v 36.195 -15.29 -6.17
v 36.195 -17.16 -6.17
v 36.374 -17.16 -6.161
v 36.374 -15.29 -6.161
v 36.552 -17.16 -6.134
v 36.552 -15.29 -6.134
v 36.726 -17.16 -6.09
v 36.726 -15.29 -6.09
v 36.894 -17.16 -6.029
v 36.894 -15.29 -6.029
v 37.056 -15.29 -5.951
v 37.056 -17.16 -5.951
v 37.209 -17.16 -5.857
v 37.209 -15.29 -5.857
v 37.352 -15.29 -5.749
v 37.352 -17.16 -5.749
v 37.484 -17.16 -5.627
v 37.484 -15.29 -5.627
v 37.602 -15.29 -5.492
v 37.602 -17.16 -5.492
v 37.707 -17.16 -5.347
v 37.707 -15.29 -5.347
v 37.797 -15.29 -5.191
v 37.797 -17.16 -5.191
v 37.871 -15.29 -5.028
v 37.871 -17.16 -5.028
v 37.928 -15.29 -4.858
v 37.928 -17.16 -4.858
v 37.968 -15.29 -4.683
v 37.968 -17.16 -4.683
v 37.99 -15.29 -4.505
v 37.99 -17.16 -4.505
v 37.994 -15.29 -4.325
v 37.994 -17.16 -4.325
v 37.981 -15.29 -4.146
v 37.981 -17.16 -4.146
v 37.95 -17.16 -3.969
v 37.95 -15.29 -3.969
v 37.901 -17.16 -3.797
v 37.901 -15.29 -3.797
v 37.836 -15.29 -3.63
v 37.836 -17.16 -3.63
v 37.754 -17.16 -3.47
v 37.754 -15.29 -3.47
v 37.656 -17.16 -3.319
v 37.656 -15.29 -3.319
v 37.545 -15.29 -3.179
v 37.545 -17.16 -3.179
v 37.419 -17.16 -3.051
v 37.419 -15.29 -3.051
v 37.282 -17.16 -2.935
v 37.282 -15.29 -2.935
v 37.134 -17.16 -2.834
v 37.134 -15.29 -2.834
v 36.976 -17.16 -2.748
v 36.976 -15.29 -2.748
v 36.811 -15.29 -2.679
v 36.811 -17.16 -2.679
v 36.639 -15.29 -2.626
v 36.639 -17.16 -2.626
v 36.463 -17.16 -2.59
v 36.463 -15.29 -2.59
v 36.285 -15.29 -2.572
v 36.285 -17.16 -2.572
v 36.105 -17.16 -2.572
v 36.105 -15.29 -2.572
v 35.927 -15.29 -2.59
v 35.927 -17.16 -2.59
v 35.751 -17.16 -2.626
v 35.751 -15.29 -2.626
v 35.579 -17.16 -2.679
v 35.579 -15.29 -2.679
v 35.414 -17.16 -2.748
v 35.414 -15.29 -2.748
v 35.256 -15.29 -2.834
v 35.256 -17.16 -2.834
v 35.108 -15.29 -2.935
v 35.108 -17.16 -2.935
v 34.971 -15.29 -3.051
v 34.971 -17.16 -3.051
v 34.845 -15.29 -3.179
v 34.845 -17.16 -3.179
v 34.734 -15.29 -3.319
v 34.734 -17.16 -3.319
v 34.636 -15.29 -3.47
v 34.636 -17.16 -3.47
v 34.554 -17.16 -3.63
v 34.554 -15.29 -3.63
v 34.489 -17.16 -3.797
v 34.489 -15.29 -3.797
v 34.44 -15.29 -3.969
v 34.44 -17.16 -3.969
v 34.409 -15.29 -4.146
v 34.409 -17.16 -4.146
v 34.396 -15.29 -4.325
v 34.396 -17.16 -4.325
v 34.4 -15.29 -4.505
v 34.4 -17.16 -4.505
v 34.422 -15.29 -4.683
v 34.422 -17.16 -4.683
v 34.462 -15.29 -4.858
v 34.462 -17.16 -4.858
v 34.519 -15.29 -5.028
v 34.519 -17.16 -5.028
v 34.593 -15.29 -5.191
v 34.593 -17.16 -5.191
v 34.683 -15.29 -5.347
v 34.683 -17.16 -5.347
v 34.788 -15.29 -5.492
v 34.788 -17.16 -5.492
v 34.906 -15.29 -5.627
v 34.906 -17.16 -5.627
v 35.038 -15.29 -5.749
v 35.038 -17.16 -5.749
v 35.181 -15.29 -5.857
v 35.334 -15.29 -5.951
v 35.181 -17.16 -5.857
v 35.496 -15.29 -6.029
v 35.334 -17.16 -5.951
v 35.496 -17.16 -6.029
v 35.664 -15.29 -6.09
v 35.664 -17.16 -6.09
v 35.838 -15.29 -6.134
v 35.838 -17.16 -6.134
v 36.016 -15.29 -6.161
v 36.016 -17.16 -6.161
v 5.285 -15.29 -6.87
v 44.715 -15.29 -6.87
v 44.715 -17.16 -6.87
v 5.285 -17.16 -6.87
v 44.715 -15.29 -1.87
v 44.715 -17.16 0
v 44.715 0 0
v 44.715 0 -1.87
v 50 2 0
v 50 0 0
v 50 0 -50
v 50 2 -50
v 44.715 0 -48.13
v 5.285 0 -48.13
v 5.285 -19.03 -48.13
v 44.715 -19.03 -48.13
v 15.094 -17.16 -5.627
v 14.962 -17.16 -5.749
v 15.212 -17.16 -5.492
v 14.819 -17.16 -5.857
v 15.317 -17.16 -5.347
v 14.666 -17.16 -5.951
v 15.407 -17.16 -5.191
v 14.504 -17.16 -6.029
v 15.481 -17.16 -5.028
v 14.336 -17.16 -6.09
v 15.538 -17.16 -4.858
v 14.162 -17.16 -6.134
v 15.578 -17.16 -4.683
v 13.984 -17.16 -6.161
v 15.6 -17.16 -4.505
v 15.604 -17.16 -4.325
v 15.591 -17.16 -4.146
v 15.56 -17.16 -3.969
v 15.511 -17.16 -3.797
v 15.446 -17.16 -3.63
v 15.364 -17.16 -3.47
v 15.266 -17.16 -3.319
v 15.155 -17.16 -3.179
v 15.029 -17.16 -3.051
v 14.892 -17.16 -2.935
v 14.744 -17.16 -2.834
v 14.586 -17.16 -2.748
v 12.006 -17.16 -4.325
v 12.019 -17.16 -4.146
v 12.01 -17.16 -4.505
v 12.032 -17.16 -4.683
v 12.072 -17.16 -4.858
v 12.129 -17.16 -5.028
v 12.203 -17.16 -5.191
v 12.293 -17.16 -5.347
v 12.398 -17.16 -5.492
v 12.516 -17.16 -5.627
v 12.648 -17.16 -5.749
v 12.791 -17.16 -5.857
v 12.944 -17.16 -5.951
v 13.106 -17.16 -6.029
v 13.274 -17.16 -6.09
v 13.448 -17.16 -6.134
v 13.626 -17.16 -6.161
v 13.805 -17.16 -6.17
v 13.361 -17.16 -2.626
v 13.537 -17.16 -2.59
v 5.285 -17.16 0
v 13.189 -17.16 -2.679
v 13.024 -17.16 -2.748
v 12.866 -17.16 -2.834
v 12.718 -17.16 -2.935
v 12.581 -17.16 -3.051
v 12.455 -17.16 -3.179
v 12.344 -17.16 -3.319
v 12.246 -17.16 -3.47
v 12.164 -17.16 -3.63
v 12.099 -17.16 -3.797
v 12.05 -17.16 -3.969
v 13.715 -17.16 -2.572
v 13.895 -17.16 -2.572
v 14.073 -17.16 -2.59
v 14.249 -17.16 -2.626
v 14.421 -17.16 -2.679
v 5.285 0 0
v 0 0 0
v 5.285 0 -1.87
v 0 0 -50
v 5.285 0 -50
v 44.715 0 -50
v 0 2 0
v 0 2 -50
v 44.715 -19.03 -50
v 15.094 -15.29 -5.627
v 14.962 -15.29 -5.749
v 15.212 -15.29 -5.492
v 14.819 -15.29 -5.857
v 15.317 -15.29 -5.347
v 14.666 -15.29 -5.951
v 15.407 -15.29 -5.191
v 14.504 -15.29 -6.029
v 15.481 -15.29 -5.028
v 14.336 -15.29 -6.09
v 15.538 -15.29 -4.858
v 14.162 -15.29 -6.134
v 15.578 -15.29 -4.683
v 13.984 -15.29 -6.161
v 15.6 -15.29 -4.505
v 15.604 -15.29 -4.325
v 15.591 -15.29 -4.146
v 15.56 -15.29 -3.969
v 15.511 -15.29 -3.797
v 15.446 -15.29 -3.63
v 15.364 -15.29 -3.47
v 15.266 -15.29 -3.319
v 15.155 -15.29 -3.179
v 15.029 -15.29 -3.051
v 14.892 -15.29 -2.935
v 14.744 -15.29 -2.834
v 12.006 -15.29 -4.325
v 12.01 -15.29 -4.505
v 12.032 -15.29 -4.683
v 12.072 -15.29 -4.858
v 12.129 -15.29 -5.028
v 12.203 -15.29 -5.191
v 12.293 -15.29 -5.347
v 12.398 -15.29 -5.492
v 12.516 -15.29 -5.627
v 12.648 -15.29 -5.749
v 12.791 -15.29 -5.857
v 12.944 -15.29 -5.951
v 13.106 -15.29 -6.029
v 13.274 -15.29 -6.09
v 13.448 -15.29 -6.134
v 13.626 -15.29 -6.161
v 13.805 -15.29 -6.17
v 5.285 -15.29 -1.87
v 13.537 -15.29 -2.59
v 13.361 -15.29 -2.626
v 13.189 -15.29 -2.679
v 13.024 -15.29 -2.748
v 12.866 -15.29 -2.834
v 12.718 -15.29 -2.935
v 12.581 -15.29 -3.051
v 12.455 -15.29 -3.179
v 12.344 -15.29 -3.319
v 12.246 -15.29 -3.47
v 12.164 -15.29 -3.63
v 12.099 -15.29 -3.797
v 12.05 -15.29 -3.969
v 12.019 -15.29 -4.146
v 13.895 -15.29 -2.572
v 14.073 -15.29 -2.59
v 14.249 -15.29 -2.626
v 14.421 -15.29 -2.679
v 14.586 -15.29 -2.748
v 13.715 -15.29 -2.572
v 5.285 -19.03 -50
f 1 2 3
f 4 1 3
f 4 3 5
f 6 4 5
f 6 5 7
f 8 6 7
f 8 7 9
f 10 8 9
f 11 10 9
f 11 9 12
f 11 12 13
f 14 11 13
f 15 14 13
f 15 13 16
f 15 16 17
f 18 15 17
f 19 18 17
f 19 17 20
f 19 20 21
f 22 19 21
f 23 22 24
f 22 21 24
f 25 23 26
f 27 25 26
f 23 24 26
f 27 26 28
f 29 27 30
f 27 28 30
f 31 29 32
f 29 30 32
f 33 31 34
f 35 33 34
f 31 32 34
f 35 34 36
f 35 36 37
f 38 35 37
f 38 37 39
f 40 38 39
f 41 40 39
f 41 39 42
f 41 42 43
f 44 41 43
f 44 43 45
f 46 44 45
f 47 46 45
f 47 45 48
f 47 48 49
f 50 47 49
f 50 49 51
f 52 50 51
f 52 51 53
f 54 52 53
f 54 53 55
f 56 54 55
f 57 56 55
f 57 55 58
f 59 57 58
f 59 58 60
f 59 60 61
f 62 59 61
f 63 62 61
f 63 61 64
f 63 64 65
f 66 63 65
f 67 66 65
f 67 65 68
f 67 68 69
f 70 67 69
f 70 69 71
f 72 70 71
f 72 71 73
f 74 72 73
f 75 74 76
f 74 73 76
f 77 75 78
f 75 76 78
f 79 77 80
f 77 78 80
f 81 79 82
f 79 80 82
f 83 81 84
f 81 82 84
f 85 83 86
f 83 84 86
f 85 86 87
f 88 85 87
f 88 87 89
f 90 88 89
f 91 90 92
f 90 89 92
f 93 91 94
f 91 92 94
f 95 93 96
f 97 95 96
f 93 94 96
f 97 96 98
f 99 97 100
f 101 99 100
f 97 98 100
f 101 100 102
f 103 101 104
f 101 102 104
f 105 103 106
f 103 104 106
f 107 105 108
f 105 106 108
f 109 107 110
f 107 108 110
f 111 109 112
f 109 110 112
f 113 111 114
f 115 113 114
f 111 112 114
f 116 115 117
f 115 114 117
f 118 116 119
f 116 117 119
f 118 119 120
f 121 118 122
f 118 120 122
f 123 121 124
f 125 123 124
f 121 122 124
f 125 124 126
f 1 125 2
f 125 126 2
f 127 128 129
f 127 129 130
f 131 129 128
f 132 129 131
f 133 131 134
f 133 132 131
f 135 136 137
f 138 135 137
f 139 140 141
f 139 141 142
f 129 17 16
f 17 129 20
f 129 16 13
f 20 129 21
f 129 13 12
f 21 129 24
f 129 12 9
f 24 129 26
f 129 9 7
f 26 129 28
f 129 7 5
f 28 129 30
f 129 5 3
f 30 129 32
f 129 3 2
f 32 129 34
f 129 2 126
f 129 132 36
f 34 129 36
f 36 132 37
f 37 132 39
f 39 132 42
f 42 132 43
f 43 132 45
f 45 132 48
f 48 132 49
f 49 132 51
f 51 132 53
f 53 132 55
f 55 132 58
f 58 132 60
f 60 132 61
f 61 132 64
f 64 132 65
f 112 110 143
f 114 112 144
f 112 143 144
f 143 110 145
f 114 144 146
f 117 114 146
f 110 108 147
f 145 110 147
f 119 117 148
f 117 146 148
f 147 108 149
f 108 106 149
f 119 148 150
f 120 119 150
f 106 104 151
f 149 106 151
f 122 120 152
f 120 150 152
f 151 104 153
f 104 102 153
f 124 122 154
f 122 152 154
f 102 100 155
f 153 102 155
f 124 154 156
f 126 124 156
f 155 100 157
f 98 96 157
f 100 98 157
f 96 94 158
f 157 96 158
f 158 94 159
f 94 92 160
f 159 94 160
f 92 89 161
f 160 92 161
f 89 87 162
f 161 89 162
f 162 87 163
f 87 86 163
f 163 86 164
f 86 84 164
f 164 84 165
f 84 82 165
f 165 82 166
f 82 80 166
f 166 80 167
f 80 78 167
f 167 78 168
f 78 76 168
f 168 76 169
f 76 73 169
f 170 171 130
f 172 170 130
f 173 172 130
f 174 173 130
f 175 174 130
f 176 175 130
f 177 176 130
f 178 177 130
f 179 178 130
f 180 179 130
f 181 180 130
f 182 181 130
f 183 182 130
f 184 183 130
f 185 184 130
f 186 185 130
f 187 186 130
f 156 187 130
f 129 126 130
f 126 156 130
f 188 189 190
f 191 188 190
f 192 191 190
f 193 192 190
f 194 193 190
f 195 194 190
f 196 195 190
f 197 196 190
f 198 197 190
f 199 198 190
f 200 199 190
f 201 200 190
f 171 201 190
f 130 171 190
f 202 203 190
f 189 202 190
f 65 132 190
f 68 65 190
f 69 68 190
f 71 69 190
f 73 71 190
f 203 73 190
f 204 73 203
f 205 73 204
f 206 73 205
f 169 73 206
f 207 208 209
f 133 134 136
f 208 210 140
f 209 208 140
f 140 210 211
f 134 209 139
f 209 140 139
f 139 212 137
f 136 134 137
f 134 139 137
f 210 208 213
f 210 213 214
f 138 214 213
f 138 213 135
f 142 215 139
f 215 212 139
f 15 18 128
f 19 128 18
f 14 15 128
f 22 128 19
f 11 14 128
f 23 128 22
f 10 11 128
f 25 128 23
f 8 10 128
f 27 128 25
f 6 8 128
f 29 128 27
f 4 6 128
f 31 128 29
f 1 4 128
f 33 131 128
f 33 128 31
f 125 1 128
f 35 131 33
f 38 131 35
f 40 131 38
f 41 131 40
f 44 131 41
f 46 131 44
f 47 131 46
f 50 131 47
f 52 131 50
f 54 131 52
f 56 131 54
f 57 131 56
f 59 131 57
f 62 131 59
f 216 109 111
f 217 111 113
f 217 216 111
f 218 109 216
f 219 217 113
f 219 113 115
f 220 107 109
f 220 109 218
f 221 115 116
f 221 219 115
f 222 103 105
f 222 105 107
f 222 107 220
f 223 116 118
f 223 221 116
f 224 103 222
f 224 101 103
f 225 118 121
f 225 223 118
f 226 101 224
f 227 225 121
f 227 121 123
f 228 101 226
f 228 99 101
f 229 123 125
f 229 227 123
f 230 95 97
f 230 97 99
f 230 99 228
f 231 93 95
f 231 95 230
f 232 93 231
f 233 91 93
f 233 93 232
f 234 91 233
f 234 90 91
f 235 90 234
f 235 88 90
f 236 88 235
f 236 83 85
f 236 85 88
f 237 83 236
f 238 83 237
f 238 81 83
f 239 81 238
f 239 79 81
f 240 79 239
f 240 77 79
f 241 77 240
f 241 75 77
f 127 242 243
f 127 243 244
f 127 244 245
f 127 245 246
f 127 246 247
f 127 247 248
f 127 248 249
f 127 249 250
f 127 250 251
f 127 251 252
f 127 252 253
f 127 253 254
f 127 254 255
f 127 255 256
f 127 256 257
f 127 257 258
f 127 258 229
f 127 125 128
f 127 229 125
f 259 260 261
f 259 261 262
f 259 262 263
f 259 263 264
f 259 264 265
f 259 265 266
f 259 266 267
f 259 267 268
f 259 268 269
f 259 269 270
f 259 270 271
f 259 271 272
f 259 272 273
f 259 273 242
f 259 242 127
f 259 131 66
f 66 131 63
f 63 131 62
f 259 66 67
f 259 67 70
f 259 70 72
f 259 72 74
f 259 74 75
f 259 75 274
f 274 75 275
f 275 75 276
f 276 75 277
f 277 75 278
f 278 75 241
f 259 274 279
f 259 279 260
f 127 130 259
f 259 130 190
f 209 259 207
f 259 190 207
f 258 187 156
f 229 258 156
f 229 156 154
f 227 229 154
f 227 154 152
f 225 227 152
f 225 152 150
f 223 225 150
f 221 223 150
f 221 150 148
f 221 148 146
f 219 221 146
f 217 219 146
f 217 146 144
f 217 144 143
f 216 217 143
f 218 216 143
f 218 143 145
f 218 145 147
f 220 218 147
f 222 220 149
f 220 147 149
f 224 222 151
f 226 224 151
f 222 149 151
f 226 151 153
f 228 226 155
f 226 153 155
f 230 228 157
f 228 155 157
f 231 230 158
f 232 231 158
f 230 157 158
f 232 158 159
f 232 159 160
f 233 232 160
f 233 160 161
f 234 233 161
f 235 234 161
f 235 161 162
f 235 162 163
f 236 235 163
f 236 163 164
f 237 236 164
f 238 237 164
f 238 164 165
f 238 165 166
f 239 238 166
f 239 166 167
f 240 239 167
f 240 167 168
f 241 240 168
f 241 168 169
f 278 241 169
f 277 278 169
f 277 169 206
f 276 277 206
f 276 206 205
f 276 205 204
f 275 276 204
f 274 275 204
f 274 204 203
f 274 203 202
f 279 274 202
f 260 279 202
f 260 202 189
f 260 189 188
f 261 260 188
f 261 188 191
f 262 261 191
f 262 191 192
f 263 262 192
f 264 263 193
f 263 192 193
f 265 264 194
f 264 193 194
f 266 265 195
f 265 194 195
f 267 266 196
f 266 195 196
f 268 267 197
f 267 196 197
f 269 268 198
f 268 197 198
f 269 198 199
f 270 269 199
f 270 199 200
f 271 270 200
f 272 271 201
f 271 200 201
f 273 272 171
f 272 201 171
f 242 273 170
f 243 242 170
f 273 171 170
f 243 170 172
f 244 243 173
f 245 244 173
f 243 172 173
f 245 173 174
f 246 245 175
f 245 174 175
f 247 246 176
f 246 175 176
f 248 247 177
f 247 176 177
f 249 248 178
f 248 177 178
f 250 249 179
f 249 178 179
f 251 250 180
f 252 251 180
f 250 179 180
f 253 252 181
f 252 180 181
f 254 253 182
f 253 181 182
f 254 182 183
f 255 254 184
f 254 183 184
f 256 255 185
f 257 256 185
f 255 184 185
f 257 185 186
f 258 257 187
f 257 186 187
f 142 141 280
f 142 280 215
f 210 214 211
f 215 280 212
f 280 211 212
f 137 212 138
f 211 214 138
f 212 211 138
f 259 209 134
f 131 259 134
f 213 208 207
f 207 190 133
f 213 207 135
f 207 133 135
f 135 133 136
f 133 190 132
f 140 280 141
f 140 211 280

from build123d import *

# Parameters (mm, degrees)
ESQUISSE1_W          = 50
ESQUISSE1_H          = 50
BOSS_EXTRU_1_DEPTH   = 2
ESQUISSE3_W          = 39.43
ESQUISSE3_H          = 1.87
BOSS_EXTRU_2_DEPTH   = 17.16
ESQUISSE4_W          = 39.43
ESQUISSE4_H          = 1.87
BOSS_EXTRU_3_DEPTH   = 5
D_GAGEMENT_M31_D     = 3.6
D_GAGEMENT_M31_DEPTH = 1.99
D_GAGEMENT_M31_TIP   = 1.081549114
ESQUISSE7_W          = 39.43
ESQUISSE7_H          = 1.87
BOSS_EXTRU_4_DEPTH   = 1.87


with BuildPart() as part:
    # Esquisse1 → Boss.-Extru.1 (new body)
    with BuildSketch(Plane(origin=(0, 0, 0), x_dir=(1, 0, 0), z_dir=(0, 1, 0))):
        with Locations((25, 25)):
            Rectangle(ESQUISSE1_W, ESQUISSE1_H)
    extrude(amount=BOSS_EXTRU_1_DEPTH)

    # Esquisse3 → Boss.-Extru.2 (add)
    with BuildSketch(Plane.XZ):
        with Locations((25, -49.065)):
            Rectangle(ESQUISSE3_W, ESQUISSE3_H)
        with Locations((25, -0.935)):
            Rectangle(ESQUISSE3_W, ESQUISSE3_H)
    extrude(amount=BOSS_EXTRU_2_DEPTH)

    # Esquisse4 → Boss.-Extru.3 (add)
    with BuildSketch(Plane(origin=(0, 0, -1.87), x_dir=(-1, 0, 0), z_dir=(0, 0, -1))):
        with Locations((-25, -16.225)):
            Rectangle(ESQUISSE4_W, ESQUISSE4_H)
    extrude(amount=BOSS_EXTRU_3_DEPTH)

    # Dégagement M31
    with Locations(Plane(origin=(36.195, -15.29, -4.37), x_dir=(0, 0, 1), z_dir=(0, 1, 0))):
        with Locations((0, 0), (0, -22.39)):
            Hole(D_GAGEMENT_M31_D / 2, depth=D_GAGEMENT_M31_DEPTH)
            with Locations((0, 0, -(D_GAGEMENT_M31_DEPTH + D_GAGEMENT_M31_TIP / 2))):  # 118° drill point
                Cone(0, D_GAGEMENT_M31_D / 2, D_GAGEMENT_M31_TIP, mode=Mode.SUBTRACT)

    # Esquisse7 → Boss.-Extru.4 (add)
    with BuildSketch(Plane.XZ.offset(17.16)):
        with Locations((25, -49.065)):
            Rectangle(ESQUISSE7_W, ESQUISSE7_H)
    extrude(amount=BOSS_EXTRU_4_DEPTH)


solid = part.part
